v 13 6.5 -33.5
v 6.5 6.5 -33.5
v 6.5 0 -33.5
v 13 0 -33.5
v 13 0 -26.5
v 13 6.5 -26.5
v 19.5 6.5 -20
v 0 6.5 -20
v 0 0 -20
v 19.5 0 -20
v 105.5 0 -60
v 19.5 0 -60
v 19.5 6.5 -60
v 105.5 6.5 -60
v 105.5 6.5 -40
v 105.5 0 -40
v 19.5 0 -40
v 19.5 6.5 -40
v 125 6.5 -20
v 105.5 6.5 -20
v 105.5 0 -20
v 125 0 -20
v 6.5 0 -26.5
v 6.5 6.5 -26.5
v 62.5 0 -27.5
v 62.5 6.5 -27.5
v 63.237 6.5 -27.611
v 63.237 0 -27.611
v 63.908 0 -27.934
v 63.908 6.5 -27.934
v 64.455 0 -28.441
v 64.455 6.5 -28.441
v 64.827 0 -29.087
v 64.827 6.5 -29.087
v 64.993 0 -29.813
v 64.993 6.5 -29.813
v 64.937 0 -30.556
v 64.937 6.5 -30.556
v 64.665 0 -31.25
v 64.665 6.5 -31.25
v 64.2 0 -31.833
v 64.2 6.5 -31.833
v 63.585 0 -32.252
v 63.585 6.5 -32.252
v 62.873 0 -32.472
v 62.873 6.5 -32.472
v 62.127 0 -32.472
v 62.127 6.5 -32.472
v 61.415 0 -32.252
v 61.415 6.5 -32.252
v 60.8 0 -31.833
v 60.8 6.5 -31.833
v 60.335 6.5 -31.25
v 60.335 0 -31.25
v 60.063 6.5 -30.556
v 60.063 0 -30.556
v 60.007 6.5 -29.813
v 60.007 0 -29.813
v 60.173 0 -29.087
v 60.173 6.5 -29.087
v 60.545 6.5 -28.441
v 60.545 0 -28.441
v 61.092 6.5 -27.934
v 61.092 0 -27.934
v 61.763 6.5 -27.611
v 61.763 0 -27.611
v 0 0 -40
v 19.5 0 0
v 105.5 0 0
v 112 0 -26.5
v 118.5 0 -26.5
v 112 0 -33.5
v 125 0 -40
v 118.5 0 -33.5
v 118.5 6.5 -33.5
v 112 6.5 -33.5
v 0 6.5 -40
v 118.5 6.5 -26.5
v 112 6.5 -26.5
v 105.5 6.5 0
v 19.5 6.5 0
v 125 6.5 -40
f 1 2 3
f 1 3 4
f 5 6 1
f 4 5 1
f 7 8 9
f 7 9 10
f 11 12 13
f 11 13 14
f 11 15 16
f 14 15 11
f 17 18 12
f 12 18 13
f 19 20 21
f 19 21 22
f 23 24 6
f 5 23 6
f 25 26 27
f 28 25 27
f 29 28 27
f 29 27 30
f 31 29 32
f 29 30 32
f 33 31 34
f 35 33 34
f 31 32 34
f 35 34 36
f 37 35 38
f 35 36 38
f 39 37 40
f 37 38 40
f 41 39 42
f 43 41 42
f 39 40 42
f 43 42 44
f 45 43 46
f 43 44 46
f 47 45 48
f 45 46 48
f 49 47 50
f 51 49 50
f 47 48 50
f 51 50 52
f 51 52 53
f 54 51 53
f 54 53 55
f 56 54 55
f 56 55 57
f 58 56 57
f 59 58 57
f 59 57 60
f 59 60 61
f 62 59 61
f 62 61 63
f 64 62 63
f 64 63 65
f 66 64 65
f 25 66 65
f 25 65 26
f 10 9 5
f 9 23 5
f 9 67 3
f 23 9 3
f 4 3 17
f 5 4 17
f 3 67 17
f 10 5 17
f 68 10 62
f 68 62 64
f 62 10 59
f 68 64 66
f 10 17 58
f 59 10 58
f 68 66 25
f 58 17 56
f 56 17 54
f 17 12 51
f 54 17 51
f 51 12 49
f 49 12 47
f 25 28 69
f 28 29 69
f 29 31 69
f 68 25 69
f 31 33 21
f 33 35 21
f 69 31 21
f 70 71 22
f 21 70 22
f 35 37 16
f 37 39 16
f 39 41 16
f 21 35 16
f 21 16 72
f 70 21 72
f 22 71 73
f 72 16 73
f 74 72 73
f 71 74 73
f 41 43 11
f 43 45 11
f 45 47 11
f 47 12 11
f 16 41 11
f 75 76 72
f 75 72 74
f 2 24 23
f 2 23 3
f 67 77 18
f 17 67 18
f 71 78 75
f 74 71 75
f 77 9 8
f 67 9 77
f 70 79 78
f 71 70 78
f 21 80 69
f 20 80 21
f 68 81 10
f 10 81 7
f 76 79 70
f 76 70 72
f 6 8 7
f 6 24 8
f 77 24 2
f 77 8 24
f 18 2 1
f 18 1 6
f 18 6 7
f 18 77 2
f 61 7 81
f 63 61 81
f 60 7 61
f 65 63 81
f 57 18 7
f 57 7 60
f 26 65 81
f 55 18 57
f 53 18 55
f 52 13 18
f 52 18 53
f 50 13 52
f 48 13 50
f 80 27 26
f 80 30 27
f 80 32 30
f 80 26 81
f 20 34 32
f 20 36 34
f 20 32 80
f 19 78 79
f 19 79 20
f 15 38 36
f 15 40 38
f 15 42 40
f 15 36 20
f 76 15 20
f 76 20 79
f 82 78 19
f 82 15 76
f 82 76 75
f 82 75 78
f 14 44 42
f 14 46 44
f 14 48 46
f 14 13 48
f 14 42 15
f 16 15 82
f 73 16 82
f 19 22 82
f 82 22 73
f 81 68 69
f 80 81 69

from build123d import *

# Parameters (mm, degrees)
SKETCH1_W           = 125
SKETCH1_H           = 60
BOSS_EXTRUDE1_DEPTH = 6.5
CUT_EXTRUDE1_REACH  = 140.807
SKETCH2_W           = 19.5
SKETCH2_H           = 20
CUT_EXTRUDE2_REACH  = 140.807
SKETCH3_R           = 2.5
CUT_EXTRUDE3_REACH  = 140.807
SKETCH6_W           = 6.5
SKETCH6_H           = 7


with BuildPart() as part:
    # Sketch1 → Boss-Extrude1 (new body)
    with BuildSketch(Plane(origin=(0, 0, 0), x_dir=(1, 0, 0), z_dir=(0, 1, 0))):
        with Locations((62.5, 30)):
            Rectangle(SKETCH1_W, SKETCH1_H)
    extrude(amount=BOSS_EXTRUDE1_DEPTH)

    # Sketch2 → Cut-Extrude1 (cut, up to next)
    with BuildSketch(Plane(origin=(0, 6.5, 0), x_dir=(1, 0, 0), z_dir=(0, 1, 0)), mode=Mode.PRIVATE) as cut_extrude1_sk1:
        with Locations((9.75, 50)):
            Rectangle(SKETCH2_W, SKETCH2_H)
    cut_extrude1_tool1 = extrude(cut_extrude1_sk1.sketch, amount=-CUT_EXTRUDE1_REACH, mode=Mode.PRIVATE) & part.part
    # Sketch2 → Cut-Extrude1 (cut, up to next)
    with BuildSketch(Plane(origin=(0, 6.5, 0), x_dir=(1, 0, 0), z_dir=(0, 1, 0)), mode=Mode.PRIVATE) as cut_extrude1_sk2:
        with Locations((9.75, 10)):
            Rectangle(SKETCH2_W, SKETCH2_H)
    cut_extrude1_tool2 = extrude(cut_extrude1_sk2.sketch, amount=-CUT_EXTRUDE1_REACH, mode=Mode.PRIVATE) & part.part
    # Sketch2 → Cut-Extrude1 (cut, up to next)
    with BuildSketch(Plane(origin=(0, 6.5, 0), x_dir=(1, 0, 0), z_dir=(0, 1, 0)), mode=Mode.PRIVATE) as cut_extrude1_sk3:
        with Locations((115.25, 50)):
            Rectangle(SKETCH2_W, SKETCH2_H)
    cut_extrude1_tool3 = extrude(cut_extrude1_sk3.sketch, amount=-CUT_EXTRUDE1_REACH, mode=Mode.PRIVATE) & part.part
    # Sketch2 → Cut-Extrude1 (cut, up to next)
    with BuildSketch(Plane(origin=(0, 6.5, 0), x_dir=(1, 0, 0), z_dir=(0, 1, 0)), mode=Mode.PRIVATE) as cut_extrude1_sk4:
        with Locations((115.25, 10)):
            Rectangle(SKETCH2_W, SKETCH2_H)
    cut_extrude1_tool4 = extrude(cut_extrude1_sk4.sketch, amount=-CUT_EXTRUDE1_REACH, mode=Mode.PRIVATE) & part.part
    add(cut_extrude1_tool1.solids().sort_by_distance((9.75, 6.5, -50))[0], mode=Mode.SUBTRACT)
    add(cut_extrude1_tool2.solids().sort_by_distance((9.75, 6.5, -10))[0], mode=Mode.SUBTRACT)
    add(cut_extrude1_tool3.solids().sort_by_distance((115.25, 6.5, -50))[0], mode=Mode.SUBTRACT)
    add(cut_extrude1_tool4.solids().sort_by_distance((115.25, 6.5, -10))[0], mode=Mode.SUBTRACT)

    # Sketch3 → Cut-Extrude2 (cut, up to next)
    with BuildSketch(Plane(origin=(0, 6.5, 0), x_dir=(1, 0, 0), z_dir=(0, 1, 0)), mode=Mode.PRIVATE) as cut_extrude2_sk1:
        with Locations(Location((62.5, 30, 0), (0, 0, 270))):
            Circle(SKETCH3_R)
    cut_extrude2_tool1 = extrude(cut_extrude2_sk1.sketch, amount=-CUT_EXTRUDE2_REACH, mode=Mode.PRIVATE) & part.part
    add(cut_extrude2_tool1.solids().sort_by_distance((62.5, 6.5, -30))[0], mode=Mode.SUBTRACT)

    # Sketch6 → Cut-Extrude3 (cut, up to next)
    with BuildSketch(Plane(origin=(0, 6.5, 0), x_dir=(1, 0, 0), z_dir=(0, 1, 0)), mode=Mode.PRIVATE) as cut_extrude3_sk1:
        with Locations((9.75, 30)):
            Rectangle(SKETCH6_W, SKETCH6_H)
    cut_extrude3_tool1 = extrude(cut_extrude3_sk1.sketch, amount=-CUT_EXTRUDE3_REACH, mode=Mode.PRIVATE) & part.part
    # Sketch6 → Cut-Extrude3 (cut, up to next)
    with BuildSketch(Plane(origin=(0, 6.5, 0), x_dir=(1, 0, 0), z_dir=(0, 1, 0)), mode=Mode.PRIVATE) as cut_extrude3_sk2:
        with Locations((115.25, 30)):
            Rectangle(SKETCH6_W, SKETCH6_H)
    cut_extrude3_tool2 = extrude(cut_extrude3_sk2.sketch, amount=-CUT_EXTRUDE3_REACH, mode=Mode.PRIVATE) & part.part
    add(cut_extrude3_tool1.solids().sort_by_distance((9.75, 6.5, -30))[0], mode=Mode.SUBTRACT)
    add(cut_extrude3_tool2.solids().sort_by_distance((115.25, 6.5, -30))[0], mode=Mode.SUBTRACT)


solid = part.part
